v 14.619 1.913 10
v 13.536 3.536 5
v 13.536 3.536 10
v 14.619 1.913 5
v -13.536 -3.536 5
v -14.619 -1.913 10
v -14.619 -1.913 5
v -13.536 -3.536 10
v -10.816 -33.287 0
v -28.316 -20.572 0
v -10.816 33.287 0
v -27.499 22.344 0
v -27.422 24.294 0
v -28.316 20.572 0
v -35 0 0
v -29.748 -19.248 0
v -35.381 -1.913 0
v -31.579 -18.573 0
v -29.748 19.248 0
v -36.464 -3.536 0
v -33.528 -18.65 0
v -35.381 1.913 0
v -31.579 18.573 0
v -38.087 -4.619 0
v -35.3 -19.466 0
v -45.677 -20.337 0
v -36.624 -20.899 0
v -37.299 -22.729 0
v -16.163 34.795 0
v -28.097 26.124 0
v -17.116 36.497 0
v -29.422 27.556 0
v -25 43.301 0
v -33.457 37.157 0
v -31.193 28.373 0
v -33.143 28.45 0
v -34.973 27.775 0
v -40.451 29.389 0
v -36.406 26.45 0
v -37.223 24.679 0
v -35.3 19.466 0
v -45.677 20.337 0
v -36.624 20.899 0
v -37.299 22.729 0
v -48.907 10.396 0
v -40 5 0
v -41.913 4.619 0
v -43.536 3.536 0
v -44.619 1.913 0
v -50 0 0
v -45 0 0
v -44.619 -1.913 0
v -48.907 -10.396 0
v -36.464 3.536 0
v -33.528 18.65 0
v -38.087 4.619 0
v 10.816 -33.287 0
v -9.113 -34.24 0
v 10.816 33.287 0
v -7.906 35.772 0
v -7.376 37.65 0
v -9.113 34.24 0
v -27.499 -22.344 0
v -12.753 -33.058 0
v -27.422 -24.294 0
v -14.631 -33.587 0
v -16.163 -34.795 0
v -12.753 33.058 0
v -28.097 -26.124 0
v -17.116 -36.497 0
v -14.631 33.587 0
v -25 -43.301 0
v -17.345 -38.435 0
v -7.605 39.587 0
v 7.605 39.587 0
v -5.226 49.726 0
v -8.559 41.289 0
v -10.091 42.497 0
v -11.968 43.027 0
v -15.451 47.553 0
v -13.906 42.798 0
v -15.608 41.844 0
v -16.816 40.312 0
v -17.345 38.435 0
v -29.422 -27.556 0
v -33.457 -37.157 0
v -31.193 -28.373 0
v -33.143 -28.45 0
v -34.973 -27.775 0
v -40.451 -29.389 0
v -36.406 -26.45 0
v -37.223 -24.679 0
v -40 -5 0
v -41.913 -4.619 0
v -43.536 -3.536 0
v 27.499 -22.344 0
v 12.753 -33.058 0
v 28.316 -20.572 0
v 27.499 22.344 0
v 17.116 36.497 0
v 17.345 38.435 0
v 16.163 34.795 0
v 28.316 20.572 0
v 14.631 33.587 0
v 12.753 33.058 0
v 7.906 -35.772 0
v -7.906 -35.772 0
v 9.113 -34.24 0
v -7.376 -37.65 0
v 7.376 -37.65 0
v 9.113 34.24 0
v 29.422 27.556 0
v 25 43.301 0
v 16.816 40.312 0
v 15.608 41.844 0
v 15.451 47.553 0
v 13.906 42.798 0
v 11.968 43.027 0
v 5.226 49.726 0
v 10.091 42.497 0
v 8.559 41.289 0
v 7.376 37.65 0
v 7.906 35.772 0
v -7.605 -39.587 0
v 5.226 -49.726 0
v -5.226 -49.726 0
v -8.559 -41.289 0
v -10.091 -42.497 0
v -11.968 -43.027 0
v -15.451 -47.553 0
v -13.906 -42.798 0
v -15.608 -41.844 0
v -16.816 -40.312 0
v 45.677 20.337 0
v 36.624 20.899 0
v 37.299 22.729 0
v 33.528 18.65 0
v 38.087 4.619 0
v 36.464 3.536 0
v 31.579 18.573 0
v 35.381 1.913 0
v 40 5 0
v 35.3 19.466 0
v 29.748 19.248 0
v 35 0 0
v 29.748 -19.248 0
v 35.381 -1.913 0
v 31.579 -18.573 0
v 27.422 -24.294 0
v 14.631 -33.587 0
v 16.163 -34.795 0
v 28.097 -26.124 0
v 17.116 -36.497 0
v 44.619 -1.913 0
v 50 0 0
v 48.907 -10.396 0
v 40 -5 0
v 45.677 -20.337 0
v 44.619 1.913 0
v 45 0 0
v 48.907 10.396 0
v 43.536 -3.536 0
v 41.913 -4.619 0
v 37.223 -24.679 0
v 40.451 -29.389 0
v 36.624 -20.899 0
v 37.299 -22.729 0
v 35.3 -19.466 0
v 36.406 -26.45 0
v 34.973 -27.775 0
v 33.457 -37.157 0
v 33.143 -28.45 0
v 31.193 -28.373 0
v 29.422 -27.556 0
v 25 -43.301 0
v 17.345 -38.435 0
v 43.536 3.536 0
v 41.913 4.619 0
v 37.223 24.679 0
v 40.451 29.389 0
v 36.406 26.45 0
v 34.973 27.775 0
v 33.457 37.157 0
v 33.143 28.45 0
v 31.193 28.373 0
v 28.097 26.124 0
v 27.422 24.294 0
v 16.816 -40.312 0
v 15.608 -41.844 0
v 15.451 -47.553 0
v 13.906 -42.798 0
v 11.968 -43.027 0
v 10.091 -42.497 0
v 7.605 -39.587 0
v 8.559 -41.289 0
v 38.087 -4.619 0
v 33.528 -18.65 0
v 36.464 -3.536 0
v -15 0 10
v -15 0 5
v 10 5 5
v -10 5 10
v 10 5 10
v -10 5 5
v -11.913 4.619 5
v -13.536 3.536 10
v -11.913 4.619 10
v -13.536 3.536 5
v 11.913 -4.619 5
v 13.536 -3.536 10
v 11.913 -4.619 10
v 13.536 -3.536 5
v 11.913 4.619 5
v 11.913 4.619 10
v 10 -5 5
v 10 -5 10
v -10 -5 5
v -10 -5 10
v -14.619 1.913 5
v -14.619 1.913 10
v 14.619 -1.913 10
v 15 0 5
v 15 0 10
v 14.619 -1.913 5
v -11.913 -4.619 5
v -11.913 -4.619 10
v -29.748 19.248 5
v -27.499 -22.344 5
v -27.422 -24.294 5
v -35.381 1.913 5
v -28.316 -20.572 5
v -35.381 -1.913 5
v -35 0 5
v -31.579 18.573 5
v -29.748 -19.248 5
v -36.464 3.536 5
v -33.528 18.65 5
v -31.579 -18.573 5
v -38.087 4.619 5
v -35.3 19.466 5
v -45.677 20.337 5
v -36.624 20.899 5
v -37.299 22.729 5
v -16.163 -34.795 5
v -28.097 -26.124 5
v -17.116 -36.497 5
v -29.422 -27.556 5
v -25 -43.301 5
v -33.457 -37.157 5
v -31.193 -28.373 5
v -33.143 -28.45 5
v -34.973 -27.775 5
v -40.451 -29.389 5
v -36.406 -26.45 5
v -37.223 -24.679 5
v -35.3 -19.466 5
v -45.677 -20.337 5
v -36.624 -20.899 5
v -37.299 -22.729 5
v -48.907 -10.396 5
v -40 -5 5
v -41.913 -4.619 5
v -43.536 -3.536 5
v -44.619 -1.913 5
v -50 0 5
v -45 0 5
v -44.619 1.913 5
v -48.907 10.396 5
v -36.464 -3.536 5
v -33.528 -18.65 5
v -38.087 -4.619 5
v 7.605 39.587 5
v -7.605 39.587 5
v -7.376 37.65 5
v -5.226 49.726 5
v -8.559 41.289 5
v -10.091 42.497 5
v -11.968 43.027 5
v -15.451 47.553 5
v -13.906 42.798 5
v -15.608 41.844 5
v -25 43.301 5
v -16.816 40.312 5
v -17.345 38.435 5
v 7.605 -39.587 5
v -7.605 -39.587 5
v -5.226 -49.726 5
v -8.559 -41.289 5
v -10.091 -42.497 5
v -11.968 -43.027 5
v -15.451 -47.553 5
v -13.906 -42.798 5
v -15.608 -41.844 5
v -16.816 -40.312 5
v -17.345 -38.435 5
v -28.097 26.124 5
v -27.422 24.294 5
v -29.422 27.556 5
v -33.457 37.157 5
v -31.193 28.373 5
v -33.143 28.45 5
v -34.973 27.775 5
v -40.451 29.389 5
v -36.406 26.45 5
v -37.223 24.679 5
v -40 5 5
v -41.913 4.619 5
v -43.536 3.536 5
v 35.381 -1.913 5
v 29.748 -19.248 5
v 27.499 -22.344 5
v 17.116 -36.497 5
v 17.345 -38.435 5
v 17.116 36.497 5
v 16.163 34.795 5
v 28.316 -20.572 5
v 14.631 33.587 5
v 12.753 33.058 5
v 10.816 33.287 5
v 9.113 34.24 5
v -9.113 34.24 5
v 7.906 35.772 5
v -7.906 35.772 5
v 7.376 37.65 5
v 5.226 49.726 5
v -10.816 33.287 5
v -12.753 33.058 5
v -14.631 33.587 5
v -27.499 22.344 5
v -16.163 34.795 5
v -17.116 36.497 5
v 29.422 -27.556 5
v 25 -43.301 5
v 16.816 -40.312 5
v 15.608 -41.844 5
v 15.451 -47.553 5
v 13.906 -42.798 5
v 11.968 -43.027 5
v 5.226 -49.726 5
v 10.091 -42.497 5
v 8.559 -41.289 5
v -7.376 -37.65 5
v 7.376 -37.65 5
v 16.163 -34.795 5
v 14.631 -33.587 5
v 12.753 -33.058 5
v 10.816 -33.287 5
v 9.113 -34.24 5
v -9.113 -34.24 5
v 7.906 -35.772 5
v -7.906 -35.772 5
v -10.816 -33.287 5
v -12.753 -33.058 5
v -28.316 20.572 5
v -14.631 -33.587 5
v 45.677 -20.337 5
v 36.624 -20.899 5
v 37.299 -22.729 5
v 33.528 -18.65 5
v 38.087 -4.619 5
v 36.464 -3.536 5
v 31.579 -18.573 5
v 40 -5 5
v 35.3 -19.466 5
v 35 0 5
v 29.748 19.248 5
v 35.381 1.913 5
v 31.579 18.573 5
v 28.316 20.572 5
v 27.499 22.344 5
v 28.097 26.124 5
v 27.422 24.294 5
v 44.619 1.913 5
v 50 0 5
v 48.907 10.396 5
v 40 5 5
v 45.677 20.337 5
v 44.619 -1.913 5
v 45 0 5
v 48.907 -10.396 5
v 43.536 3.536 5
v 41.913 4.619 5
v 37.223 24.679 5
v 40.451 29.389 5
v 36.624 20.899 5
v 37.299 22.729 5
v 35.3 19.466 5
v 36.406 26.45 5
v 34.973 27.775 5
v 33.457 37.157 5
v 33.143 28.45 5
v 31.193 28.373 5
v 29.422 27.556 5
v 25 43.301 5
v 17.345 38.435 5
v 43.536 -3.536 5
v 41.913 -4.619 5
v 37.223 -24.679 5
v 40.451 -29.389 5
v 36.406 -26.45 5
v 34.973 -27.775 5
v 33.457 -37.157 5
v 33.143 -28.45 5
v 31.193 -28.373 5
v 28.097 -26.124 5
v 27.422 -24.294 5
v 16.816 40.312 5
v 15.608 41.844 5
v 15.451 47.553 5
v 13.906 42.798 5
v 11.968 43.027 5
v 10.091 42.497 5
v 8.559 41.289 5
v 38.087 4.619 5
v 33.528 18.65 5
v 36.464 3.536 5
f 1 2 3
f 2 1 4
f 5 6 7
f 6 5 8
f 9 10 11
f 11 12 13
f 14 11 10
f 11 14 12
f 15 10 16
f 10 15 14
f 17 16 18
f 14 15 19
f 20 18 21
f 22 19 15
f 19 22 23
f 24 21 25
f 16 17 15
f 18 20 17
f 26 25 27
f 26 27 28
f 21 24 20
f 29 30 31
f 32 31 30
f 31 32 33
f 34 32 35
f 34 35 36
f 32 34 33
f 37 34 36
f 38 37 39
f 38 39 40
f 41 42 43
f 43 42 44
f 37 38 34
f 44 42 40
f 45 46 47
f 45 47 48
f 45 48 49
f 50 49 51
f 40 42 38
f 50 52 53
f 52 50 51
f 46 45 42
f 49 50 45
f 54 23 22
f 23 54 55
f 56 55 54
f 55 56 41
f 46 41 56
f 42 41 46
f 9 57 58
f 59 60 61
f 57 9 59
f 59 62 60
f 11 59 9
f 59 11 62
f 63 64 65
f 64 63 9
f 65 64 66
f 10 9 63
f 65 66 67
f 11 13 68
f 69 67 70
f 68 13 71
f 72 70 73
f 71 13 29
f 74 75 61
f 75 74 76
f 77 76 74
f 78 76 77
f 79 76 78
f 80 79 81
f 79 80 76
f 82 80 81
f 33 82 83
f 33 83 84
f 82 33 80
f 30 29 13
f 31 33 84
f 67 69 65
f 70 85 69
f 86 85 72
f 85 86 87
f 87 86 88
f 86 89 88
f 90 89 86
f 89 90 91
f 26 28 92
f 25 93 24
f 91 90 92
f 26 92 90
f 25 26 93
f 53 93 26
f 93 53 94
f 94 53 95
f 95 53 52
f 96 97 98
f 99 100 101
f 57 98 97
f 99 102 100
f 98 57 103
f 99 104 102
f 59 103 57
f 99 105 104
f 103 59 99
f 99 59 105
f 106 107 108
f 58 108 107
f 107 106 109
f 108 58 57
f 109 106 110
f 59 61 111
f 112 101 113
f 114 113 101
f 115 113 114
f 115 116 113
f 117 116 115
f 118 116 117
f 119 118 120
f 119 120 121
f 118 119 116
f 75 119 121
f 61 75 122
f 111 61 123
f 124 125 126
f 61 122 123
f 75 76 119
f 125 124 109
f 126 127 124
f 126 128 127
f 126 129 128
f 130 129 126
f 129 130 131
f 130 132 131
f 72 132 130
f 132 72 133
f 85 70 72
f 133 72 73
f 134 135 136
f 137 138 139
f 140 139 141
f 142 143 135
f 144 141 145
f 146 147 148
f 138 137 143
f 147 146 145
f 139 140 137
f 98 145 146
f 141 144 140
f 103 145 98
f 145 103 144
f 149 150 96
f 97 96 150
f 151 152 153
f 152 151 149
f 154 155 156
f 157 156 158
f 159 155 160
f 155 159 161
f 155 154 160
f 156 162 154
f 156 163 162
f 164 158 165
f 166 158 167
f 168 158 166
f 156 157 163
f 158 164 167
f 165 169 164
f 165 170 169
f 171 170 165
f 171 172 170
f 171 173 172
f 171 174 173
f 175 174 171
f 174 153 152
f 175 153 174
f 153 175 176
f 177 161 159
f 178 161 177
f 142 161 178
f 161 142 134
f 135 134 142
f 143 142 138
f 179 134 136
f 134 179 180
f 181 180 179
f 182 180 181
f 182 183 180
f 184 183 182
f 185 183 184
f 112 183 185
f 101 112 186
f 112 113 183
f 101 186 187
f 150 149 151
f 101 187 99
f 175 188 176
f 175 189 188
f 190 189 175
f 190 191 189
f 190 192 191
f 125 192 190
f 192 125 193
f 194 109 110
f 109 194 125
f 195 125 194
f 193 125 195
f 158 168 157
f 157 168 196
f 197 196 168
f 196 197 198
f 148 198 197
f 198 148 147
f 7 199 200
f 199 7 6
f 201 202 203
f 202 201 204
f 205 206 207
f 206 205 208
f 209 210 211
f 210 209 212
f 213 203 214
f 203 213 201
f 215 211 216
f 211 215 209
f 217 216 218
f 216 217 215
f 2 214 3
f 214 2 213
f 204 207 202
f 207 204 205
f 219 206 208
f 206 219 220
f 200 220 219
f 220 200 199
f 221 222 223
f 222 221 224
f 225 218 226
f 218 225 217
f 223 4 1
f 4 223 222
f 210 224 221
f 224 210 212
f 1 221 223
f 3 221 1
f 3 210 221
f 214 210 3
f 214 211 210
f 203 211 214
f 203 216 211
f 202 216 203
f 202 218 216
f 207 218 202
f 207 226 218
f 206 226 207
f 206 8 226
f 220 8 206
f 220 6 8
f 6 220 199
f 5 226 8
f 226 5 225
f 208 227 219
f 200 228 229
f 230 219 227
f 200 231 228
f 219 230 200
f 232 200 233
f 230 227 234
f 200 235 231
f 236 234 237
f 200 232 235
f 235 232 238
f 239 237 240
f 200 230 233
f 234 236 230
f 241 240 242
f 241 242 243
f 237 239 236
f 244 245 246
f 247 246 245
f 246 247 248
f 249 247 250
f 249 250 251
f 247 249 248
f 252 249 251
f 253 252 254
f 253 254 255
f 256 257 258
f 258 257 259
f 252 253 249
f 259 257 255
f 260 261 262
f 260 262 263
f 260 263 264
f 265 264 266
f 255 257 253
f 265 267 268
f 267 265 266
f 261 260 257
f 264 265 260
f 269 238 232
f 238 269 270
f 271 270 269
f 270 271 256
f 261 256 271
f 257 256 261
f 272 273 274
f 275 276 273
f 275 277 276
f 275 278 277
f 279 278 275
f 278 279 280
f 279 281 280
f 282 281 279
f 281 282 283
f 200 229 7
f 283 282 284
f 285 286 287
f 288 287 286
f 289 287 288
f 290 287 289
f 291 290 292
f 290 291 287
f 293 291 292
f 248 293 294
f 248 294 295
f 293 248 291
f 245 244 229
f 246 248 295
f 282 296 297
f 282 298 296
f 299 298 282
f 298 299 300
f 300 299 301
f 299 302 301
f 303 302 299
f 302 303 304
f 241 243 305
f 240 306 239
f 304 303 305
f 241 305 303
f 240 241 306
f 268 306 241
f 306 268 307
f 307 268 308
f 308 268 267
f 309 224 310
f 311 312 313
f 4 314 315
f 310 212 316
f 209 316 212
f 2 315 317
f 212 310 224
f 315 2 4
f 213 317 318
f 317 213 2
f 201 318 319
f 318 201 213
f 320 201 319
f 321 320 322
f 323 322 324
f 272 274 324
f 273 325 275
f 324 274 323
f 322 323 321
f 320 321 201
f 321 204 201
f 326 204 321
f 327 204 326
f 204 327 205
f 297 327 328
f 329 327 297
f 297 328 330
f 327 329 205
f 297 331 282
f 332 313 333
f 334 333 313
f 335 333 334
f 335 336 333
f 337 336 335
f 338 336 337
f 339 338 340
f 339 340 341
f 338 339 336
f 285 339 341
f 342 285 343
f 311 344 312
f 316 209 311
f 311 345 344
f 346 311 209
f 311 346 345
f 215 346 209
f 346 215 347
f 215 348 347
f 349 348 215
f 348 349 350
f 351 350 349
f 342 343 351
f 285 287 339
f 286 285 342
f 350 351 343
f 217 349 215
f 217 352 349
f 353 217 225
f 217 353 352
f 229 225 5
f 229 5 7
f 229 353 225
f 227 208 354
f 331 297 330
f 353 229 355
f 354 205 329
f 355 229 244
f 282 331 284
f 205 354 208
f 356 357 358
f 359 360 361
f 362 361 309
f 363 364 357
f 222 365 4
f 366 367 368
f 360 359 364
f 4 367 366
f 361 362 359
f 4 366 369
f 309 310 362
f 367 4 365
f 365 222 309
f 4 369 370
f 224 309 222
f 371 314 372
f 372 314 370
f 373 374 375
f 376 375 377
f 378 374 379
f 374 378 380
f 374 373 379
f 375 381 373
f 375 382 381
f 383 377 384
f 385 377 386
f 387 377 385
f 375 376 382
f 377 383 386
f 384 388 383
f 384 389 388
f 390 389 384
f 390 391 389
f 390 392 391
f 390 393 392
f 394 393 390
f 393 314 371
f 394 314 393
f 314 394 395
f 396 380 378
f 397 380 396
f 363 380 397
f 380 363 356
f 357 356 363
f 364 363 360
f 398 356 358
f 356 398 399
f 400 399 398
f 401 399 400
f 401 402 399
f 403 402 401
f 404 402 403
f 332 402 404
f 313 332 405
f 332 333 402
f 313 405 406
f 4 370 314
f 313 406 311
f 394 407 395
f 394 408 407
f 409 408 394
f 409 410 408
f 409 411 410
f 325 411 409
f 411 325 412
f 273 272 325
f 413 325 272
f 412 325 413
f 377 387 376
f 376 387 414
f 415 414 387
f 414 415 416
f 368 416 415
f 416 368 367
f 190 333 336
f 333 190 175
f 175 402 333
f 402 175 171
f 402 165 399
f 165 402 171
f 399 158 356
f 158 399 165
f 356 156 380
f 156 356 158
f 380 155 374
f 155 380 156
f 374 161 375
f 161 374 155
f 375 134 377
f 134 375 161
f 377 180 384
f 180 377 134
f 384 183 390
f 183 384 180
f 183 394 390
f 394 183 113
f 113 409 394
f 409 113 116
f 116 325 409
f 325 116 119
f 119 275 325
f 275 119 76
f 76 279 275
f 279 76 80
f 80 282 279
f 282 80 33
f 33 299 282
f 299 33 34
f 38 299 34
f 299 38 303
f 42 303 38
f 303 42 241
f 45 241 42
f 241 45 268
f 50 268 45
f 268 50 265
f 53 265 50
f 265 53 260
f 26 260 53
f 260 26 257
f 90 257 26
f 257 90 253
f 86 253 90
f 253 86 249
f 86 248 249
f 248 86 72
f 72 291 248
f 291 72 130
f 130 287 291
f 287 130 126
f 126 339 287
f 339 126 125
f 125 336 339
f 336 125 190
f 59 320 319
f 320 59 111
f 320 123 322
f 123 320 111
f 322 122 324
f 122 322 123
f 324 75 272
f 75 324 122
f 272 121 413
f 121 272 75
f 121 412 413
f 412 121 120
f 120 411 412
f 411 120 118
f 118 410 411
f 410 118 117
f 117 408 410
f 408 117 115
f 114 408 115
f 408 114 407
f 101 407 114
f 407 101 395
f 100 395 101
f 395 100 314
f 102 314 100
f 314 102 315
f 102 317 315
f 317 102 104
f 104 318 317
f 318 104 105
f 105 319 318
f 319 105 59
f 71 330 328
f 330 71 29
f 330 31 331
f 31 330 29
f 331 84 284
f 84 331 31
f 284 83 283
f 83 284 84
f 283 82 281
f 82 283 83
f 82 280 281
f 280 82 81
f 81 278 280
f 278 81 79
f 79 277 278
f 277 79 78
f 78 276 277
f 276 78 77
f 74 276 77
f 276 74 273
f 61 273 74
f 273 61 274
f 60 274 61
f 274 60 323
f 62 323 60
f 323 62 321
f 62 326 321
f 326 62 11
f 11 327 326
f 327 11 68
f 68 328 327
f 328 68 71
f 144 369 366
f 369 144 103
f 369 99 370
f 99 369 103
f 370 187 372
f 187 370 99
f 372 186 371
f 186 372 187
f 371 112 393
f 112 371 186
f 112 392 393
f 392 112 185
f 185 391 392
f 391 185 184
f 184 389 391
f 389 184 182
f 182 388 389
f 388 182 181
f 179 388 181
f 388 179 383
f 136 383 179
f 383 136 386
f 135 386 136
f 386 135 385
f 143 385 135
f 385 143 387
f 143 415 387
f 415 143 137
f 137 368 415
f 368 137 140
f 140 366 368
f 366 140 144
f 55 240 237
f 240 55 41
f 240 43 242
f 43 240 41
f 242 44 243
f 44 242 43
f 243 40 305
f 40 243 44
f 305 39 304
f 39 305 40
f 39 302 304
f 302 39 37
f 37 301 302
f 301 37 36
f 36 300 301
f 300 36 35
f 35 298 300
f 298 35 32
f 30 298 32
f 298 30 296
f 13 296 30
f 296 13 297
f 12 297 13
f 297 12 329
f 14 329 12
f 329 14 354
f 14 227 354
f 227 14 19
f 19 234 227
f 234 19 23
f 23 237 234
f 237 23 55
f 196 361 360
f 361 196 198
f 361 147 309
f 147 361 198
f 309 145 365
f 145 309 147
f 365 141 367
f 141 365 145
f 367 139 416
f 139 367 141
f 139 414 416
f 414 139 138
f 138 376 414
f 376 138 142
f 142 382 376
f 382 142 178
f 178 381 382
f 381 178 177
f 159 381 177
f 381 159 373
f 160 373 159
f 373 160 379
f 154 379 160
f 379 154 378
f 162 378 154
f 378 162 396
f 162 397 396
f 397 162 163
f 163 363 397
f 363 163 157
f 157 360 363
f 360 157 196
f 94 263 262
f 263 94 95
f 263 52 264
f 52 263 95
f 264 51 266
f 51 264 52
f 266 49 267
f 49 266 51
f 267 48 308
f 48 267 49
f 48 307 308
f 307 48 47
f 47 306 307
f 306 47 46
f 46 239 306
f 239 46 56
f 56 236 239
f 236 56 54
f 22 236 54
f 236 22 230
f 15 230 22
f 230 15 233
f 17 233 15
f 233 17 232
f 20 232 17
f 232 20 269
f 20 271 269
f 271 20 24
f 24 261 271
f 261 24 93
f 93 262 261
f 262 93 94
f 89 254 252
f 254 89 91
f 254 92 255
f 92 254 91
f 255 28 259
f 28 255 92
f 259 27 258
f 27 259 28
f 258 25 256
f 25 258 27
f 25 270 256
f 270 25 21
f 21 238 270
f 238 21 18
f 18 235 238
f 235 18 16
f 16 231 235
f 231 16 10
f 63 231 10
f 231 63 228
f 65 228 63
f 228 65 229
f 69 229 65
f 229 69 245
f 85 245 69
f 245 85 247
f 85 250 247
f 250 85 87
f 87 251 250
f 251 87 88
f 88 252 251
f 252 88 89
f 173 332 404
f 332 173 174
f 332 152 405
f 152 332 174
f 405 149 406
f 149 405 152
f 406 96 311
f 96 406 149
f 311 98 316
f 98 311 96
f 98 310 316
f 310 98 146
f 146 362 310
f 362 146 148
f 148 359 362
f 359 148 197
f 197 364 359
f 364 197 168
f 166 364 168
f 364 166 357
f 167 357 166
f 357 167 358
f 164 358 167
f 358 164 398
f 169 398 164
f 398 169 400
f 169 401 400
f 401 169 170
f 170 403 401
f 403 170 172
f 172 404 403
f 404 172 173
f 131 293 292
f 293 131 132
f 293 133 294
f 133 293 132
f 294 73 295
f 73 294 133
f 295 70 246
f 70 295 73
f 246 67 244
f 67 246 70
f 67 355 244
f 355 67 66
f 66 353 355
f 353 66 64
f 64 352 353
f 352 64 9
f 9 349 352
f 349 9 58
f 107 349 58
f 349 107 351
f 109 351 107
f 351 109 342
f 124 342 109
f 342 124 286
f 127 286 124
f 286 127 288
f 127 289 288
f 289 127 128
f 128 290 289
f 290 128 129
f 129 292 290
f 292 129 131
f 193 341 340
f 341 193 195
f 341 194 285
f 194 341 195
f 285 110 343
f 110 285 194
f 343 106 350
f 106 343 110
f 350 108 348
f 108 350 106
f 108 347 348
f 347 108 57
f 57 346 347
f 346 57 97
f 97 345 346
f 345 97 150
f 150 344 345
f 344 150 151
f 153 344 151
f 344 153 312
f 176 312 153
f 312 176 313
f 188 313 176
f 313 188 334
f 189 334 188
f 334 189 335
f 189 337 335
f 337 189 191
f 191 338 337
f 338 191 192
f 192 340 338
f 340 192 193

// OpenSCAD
// An extruded pill
linear_extrude(10)
	hull() {
		translate([10, 0, 0])
			circle(r=5);

		translate([-10, 0, 0])
			circle(r=5);
	}
	
	

// An extruded pill with holes in
*linear_extrude(10)
	difference() {
		// the pill shape
		hull() {
			translate([10, 0, 0])
				circle(r=5);

			translate([-10, 0, 0])
				circle(r=5);
		}
		
		// some holes
		translate([10, 0, 0])
			circle(r=3);
			
		translate([-10, 0, 0])
			circle(r=3);
	}
	
	
// A big disc with a bunch of holes punched round the edge
linear_extrude(5)
	difference() {
		// the big circle, radius = 50mm
		circle(50);
		
		// 10 holes round the edge, formed using a for loop
		for (i=[0:9])  // the colon specifies this is a range
			rotate([0, 0, i* 360/10]) 
			translate([40, 0, 0])
			circle(5);
	}
